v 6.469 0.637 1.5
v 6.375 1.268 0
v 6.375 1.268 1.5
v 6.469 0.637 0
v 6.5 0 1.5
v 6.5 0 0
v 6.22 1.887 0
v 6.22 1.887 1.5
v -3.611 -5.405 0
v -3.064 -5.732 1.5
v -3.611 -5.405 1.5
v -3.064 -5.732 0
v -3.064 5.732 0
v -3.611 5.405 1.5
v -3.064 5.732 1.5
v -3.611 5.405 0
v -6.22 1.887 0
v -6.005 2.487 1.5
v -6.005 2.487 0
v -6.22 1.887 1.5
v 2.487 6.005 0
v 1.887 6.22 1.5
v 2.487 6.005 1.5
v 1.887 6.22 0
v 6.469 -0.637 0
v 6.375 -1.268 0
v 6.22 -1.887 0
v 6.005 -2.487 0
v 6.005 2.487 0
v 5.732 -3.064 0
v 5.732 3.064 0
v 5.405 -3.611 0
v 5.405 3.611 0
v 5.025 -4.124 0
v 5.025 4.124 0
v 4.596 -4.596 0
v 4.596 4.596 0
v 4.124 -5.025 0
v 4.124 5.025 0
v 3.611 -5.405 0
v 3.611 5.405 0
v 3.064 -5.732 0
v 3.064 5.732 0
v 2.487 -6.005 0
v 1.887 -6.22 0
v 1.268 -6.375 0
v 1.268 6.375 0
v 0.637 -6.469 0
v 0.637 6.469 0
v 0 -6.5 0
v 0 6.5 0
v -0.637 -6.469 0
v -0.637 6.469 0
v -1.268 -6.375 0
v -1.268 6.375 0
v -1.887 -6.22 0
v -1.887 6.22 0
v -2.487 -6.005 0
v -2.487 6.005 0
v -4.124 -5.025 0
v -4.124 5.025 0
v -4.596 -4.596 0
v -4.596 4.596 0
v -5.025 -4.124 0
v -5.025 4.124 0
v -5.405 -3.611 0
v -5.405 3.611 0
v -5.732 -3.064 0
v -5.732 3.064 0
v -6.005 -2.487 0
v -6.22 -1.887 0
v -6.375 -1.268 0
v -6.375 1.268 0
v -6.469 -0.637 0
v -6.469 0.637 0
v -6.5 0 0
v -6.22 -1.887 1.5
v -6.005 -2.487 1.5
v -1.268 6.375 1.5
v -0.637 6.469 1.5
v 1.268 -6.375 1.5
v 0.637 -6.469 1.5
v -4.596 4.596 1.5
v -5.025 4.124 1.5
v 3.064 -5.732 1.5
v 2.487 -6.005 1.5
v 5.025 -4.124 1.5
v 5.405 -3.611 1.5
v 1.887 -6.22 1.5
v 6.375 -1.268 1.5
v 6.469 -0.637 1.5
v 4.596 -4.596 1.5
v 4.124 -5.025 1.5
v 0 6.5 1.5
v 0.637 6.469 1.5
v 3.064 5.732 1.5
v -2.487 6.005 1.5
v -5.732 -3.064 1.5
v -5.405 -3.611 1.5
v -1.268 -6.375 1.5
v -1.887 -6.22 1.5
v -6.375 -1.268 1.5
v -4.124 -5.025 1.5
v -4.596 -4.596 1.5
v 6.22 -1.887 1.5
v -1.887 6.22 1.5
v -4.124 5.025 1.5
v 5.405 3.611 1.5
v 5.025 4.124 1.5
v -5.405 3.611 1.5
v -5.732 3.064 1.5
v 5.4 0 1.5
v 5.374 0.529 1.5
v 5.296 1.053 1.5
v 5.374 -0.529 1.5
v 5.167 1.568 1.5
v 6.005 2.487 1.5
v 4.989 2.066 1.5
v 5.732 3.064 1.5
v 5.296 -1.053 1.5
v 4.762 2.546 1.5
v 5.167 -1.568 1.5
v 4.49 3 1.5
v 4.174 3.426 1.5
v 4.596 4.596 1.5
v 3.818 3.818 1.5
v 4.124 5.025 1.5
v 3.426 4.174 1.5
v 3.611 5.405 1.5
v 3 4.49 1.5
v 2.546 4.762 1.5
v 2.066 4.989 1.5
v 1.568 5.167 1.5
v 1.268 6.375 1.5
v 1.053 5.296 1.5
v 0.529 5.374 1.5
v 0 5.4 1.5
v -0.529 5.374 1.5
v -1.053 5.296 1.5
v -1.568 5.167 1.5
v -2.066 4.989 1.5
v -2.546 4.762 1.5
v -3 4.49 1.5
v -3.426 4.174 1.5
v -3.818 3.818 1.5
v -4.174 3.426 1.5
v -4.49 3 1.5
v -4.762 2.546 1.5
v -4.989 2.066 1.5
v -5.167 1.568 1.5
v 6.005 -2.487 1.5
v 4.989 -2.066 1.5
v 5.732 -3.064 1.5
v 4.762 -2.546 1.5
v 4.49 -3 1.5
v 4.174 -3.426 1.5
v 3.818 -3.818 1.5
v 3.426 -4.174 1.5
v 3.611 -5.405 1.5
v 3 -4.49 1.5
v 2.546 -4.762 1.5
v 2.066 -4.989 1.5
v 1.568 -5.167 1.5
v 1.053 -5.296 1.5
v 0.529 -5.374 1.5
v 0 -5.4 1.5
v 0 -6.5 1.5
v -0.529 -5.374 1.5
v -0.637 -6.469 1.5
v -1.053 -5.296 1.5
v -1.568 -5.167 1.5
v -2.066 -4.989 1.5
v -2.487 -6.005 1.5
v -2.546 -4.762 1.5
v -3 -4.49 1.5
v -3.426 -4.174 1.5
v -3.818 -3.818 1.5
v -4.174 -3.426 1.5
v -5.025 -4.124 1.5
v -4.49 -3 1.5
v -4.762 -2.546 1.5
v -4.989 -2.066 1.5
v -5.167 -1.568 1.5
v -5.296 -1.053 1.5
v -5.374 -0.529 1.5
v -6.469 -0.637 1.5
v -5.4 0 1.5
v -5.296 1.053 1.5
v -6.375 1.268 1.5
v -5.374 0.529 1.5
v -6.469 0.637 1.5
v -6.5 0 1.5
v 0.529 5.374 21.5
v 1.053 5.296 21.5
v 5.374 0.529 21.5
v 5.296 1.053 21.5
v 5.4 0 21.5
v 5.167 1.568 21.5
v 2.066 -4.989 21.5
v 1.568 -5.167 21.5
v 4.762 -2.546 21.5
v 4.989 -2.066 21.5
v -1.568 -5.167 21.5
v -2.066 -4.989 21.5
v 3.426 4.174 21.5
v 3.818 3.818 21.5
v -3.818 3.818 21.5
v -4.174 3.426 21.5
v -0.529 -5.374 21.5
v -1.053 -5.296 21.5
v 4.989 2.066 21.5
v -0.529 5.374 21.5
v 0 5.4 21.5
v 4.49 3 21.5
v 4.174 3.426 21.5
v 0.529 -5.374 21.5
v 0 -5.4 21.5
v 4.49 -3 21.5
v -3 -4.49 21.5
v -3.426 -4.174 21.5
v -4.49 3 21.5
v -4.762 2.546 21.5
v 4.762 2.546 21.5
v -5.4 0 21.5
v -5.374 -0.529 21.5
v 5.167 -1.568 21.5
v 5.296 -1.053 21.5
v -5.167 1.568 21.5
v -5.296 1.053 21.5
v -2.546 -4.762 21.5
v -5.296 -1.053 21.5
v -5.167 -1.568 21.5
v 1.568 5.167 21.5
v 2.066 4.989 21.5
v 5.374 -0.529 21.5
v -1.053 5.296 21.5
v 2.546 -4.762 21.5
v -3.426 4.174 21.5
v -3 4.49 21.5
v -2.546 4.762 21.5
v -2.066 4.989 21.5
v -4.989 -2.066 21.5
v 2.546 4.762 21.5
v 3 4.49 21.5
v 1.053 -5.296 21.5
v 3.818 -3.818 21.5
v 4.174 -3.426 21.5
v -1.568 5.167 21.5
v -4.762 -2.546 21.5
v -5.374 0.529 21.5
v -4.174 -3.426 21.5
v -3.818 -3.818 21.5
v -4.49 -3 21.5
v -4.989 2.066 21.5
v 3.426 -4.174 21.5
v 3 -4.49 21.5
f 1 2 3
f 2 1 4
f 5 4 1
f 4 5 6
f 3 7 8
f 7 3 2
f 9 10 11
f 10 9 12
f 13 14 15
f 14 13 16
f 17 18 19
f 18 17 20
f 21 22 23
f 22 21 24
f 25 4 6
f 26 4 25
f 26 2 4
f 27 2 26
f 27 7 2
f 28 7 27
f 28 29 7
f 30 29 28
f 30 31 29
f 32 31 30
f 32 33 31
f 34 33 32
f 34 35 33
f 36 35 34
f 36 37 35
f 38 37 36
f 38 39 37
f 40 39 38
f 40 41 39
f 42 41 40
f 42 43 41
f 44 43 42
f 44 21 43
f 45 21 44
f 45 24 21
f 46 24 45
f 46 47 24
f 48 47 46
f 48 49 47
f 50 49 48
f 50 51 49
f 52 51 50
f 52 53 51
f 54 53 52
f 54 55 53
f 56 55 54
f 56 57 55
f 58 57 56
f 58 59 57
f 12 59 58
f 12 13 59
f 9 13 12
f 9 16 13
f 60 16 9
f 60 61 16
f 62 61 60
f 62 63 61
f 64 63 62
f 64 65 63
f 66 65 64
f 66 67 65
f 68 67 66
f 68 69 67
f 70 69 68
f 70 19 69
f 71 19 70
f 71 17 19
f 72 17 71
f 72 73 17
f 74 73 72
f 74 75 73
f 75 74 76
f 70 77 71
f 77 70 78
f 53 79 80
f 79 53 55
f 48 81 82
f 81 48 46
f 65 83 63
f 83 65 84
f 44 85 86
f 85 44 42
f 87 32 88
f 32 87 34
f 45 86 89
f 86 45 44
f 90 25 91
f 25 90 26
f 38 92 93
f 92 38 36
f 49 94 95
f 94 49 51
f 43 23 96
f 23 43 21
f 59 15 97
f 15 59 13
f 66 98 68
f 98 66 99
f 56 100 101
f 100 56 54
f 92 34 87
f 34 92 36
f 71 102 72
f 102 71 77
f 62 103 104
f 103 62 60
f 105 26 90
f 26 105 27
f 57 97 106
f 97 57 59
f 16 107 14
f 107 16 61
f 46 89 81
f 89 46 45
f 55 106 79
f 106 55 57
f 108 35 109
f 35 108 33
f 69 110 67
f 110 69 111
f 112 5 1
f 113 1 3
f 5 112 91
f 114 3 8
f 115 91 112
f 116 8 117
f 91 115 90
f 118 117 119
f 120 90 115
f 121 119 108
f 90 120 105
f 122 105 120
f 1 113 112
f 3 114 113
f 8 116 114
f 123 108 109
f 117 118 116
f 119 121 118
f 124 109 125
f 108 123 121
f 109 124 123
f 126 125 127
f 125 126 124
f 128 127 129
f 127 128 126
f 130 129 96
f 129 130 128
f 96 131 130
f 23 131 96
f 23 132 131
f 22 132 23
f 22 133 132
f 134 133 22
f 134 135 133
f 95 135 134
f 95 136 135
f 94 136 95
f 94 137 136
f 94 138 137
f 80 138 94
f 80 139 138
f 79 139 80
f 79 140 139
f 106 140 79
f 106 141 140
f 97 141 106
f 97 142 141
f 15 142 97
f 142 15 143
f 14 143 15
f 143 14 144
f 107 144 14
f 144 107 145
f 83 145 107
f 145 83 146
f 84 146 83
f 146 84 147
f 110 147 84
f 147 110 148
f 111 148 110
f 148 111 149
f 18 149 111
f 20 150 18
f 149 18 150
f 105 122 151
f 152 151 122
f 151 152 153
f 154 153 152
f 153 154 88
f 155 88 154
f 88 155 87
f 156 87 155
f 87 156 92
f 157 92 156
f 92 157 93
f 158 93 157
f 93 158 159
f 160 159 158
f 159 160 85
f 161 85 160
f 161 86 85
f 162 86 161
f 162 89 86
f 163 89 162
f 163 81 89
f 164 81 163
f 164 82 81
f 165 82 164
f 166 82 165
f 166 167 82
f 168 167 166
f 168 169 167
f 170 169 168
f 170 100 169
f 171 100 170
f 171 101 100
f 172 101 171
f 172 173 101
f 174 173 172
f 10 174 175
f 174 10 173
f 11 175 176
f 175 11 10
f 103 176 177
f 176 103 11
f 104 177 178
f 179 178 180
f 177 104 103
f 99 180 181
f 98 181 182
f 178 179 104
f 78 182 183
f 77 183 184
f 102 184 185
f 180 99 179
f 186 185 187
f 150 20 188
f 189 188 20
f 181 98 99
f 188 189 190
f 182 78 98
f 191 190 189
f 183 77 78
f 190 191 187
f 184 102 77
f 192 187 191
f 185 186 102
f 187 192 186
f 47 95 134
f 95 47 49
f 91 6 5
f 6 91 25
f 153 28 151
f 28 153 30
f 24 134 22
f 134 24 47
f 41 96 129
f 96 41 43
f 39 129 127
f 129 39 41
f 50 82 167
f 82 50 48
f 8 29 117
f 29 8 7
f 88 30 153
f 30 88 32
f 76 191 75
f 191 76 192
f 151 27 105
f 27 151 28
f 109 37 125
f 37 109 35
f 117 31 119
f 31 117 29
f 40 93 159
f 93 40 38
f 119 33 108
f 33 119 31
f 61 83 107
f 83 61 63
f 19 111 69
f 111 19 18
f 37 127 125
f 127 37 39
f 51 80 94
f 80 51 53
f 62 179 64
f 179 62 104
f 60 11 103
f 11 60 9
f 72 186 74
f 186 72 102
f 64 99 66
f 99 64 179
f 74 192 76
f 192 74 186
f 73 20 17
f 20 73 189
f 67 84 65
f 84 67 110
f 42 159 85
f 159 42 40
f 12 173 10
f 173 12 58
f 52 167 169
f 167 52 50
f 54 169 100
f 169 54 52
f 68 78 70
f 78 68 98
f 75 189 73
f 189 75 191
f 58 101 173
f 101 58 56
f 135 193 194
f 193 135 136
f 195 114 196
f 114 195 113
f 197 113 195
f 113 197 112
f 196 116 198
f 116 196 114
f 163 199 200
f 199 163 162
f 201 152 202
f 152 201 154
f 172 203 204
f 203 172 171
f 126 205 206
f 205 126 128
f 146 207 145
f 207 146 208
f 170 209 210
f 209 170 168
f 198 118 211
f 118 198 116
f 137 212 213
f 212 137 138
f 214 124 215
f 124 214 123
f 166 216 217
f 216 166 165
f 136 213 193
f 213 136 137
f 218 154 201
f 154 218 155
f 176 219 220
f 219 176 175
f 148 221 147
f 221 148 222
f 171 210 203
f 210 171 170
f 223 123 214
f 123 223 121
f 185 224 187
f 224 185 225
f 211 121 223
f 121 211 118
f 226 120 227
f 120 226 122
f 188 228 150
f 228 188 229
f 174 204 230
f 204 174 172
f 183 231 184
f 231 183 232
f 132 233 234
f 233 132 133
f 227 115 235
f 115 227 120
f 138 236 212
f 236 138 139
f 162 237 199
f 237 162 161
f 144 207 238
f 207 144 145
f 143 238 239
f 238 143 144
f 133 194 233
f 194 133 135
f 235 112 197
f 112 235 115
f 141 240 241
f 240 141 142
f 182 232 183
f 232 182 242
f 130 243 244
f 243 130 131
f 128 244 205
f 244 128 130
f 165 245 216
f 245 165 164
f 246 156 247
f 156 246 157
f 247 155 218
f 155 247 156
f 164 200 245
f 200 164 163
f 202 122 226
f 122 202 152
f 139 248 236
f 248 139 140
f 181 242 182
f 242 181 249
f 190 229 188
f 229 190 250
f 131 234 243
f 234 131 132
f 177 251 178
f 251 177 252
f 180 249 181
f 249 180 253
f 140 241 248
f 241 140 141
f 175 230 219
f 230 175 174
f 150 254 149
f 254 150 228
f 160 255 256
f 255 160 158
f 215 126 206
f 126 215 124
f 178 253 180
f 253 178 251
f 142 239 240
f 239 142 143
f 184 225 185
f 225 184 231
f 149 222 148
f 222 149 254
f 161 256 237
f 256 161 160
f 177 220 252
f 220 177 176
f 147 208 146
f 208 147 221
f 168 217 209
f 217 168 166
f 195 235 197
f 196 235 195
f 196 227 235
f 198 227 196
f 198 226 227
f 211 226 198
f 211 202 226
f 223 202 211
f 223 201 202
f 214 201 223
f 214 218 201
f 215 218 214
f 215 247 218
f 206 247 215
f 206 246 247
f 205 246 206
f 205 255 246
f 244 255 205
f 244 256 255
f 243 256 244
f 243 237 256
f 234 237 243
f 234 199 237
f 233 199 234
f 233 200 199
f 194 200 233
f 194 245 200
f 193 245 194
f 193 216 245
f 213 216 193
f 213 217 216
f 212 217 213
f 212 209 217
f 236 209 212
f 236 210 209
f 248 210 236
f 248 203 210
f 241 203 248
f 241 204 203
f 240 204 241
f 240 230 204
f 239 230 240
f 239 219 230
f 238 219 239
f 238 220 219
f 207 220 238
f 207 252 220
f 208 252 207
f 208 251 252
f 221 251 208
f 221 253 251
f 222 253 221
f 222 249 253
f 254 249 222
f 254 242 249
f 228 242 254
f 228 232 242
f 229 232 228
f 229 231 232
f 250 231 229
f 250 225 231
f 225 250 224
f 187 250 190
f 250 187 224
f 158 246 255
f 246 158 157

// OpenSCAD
// --- Dimensions (mm) ---
collar_diameter = 13.0;      // Diameter of the base collar
collar_thickness = 1.5;      // Height of the base collar
sleeve_outer_diameter = 10.8; // Diameter of the main sleeve body
sleeve_height_total = 21.5;  // Total height from Z=0 to top of sleeve
bore_diameter = 6.2;         // Diameter of the central hole

// --- Resolution ---
$fn = 64;

// --- Implementation ---

// The part is printed "upside down" relative to the description:
// The collar lies on the bed (z=0 to 1.5), and the sleeve rises from there.
// This means the collar is the base.

union() {
    // 1. The Base Collar
    cylinder(d = collar_diameter, h = collar_thickness);

    // 2. The Sleeve Body
    // It rises from the top of the collar (z = 1.5) to z = 21.5.
    // The total height of the cylinder is 21.5 - 1.5 = 20.0.
    translate([0, 0, collar_thickness])
        cylinder(d = sleeve_outer_diameter, h = sleeve_height_total - collar_thickness);
}

// 3. The Central Bore (Subtraction)
// The bore runs through the full height, open at both ends.
// We use a difference to cut the hole through the entire assembly.
difference() {
    // We wrap the whole assembly in a union to ensure the difference 
    // acts on the combined object, but for cleaner code, we'll 
    // just subtract the bore from the union of the two parts.
    
    // Re-defining the assembly to subtract from
    union() {
        cylinder(d = collar_diameter, h = collar_thickness);
        translate([0, 0, collar_thickness])
            cylinder(d = sleeve_outer_diameter, h = sleeve_height_total - collar_thickness);
    }

    // The Bore
    // To ensure no thin faces remain, we extend the cylinder slightly 
    // above and below the object.
    translate([0, 0, -1])
        cylinder(d = bore_diameter, h = sleeve_height_total + 2);
}

// Note: The logic above is slightly redundant for clarity. 
// Let's rewrite the final structure cleanly for the render engine.

/* 
REFINED STRUCTURE:
*/

difference() {
    // The Solid Body
    union() {
        // Collar
        cylinder(d = collar_diameter, h = collar_thickness);
        // Sleeve
        translate([0, 0, collar_thickness])
            cylinder(d = sleeve_outer_diameter, h = sleeve_height_total - collar_thickness);
    }

    // The Bore (Cutting through everything)
    // We extend it by 1mm on top and bottom to prevent coplanar artifacts
    translate([0, 0, -1])
        cylinder(d = bore_diameter, h = sleeve_height_total + 2);
}
